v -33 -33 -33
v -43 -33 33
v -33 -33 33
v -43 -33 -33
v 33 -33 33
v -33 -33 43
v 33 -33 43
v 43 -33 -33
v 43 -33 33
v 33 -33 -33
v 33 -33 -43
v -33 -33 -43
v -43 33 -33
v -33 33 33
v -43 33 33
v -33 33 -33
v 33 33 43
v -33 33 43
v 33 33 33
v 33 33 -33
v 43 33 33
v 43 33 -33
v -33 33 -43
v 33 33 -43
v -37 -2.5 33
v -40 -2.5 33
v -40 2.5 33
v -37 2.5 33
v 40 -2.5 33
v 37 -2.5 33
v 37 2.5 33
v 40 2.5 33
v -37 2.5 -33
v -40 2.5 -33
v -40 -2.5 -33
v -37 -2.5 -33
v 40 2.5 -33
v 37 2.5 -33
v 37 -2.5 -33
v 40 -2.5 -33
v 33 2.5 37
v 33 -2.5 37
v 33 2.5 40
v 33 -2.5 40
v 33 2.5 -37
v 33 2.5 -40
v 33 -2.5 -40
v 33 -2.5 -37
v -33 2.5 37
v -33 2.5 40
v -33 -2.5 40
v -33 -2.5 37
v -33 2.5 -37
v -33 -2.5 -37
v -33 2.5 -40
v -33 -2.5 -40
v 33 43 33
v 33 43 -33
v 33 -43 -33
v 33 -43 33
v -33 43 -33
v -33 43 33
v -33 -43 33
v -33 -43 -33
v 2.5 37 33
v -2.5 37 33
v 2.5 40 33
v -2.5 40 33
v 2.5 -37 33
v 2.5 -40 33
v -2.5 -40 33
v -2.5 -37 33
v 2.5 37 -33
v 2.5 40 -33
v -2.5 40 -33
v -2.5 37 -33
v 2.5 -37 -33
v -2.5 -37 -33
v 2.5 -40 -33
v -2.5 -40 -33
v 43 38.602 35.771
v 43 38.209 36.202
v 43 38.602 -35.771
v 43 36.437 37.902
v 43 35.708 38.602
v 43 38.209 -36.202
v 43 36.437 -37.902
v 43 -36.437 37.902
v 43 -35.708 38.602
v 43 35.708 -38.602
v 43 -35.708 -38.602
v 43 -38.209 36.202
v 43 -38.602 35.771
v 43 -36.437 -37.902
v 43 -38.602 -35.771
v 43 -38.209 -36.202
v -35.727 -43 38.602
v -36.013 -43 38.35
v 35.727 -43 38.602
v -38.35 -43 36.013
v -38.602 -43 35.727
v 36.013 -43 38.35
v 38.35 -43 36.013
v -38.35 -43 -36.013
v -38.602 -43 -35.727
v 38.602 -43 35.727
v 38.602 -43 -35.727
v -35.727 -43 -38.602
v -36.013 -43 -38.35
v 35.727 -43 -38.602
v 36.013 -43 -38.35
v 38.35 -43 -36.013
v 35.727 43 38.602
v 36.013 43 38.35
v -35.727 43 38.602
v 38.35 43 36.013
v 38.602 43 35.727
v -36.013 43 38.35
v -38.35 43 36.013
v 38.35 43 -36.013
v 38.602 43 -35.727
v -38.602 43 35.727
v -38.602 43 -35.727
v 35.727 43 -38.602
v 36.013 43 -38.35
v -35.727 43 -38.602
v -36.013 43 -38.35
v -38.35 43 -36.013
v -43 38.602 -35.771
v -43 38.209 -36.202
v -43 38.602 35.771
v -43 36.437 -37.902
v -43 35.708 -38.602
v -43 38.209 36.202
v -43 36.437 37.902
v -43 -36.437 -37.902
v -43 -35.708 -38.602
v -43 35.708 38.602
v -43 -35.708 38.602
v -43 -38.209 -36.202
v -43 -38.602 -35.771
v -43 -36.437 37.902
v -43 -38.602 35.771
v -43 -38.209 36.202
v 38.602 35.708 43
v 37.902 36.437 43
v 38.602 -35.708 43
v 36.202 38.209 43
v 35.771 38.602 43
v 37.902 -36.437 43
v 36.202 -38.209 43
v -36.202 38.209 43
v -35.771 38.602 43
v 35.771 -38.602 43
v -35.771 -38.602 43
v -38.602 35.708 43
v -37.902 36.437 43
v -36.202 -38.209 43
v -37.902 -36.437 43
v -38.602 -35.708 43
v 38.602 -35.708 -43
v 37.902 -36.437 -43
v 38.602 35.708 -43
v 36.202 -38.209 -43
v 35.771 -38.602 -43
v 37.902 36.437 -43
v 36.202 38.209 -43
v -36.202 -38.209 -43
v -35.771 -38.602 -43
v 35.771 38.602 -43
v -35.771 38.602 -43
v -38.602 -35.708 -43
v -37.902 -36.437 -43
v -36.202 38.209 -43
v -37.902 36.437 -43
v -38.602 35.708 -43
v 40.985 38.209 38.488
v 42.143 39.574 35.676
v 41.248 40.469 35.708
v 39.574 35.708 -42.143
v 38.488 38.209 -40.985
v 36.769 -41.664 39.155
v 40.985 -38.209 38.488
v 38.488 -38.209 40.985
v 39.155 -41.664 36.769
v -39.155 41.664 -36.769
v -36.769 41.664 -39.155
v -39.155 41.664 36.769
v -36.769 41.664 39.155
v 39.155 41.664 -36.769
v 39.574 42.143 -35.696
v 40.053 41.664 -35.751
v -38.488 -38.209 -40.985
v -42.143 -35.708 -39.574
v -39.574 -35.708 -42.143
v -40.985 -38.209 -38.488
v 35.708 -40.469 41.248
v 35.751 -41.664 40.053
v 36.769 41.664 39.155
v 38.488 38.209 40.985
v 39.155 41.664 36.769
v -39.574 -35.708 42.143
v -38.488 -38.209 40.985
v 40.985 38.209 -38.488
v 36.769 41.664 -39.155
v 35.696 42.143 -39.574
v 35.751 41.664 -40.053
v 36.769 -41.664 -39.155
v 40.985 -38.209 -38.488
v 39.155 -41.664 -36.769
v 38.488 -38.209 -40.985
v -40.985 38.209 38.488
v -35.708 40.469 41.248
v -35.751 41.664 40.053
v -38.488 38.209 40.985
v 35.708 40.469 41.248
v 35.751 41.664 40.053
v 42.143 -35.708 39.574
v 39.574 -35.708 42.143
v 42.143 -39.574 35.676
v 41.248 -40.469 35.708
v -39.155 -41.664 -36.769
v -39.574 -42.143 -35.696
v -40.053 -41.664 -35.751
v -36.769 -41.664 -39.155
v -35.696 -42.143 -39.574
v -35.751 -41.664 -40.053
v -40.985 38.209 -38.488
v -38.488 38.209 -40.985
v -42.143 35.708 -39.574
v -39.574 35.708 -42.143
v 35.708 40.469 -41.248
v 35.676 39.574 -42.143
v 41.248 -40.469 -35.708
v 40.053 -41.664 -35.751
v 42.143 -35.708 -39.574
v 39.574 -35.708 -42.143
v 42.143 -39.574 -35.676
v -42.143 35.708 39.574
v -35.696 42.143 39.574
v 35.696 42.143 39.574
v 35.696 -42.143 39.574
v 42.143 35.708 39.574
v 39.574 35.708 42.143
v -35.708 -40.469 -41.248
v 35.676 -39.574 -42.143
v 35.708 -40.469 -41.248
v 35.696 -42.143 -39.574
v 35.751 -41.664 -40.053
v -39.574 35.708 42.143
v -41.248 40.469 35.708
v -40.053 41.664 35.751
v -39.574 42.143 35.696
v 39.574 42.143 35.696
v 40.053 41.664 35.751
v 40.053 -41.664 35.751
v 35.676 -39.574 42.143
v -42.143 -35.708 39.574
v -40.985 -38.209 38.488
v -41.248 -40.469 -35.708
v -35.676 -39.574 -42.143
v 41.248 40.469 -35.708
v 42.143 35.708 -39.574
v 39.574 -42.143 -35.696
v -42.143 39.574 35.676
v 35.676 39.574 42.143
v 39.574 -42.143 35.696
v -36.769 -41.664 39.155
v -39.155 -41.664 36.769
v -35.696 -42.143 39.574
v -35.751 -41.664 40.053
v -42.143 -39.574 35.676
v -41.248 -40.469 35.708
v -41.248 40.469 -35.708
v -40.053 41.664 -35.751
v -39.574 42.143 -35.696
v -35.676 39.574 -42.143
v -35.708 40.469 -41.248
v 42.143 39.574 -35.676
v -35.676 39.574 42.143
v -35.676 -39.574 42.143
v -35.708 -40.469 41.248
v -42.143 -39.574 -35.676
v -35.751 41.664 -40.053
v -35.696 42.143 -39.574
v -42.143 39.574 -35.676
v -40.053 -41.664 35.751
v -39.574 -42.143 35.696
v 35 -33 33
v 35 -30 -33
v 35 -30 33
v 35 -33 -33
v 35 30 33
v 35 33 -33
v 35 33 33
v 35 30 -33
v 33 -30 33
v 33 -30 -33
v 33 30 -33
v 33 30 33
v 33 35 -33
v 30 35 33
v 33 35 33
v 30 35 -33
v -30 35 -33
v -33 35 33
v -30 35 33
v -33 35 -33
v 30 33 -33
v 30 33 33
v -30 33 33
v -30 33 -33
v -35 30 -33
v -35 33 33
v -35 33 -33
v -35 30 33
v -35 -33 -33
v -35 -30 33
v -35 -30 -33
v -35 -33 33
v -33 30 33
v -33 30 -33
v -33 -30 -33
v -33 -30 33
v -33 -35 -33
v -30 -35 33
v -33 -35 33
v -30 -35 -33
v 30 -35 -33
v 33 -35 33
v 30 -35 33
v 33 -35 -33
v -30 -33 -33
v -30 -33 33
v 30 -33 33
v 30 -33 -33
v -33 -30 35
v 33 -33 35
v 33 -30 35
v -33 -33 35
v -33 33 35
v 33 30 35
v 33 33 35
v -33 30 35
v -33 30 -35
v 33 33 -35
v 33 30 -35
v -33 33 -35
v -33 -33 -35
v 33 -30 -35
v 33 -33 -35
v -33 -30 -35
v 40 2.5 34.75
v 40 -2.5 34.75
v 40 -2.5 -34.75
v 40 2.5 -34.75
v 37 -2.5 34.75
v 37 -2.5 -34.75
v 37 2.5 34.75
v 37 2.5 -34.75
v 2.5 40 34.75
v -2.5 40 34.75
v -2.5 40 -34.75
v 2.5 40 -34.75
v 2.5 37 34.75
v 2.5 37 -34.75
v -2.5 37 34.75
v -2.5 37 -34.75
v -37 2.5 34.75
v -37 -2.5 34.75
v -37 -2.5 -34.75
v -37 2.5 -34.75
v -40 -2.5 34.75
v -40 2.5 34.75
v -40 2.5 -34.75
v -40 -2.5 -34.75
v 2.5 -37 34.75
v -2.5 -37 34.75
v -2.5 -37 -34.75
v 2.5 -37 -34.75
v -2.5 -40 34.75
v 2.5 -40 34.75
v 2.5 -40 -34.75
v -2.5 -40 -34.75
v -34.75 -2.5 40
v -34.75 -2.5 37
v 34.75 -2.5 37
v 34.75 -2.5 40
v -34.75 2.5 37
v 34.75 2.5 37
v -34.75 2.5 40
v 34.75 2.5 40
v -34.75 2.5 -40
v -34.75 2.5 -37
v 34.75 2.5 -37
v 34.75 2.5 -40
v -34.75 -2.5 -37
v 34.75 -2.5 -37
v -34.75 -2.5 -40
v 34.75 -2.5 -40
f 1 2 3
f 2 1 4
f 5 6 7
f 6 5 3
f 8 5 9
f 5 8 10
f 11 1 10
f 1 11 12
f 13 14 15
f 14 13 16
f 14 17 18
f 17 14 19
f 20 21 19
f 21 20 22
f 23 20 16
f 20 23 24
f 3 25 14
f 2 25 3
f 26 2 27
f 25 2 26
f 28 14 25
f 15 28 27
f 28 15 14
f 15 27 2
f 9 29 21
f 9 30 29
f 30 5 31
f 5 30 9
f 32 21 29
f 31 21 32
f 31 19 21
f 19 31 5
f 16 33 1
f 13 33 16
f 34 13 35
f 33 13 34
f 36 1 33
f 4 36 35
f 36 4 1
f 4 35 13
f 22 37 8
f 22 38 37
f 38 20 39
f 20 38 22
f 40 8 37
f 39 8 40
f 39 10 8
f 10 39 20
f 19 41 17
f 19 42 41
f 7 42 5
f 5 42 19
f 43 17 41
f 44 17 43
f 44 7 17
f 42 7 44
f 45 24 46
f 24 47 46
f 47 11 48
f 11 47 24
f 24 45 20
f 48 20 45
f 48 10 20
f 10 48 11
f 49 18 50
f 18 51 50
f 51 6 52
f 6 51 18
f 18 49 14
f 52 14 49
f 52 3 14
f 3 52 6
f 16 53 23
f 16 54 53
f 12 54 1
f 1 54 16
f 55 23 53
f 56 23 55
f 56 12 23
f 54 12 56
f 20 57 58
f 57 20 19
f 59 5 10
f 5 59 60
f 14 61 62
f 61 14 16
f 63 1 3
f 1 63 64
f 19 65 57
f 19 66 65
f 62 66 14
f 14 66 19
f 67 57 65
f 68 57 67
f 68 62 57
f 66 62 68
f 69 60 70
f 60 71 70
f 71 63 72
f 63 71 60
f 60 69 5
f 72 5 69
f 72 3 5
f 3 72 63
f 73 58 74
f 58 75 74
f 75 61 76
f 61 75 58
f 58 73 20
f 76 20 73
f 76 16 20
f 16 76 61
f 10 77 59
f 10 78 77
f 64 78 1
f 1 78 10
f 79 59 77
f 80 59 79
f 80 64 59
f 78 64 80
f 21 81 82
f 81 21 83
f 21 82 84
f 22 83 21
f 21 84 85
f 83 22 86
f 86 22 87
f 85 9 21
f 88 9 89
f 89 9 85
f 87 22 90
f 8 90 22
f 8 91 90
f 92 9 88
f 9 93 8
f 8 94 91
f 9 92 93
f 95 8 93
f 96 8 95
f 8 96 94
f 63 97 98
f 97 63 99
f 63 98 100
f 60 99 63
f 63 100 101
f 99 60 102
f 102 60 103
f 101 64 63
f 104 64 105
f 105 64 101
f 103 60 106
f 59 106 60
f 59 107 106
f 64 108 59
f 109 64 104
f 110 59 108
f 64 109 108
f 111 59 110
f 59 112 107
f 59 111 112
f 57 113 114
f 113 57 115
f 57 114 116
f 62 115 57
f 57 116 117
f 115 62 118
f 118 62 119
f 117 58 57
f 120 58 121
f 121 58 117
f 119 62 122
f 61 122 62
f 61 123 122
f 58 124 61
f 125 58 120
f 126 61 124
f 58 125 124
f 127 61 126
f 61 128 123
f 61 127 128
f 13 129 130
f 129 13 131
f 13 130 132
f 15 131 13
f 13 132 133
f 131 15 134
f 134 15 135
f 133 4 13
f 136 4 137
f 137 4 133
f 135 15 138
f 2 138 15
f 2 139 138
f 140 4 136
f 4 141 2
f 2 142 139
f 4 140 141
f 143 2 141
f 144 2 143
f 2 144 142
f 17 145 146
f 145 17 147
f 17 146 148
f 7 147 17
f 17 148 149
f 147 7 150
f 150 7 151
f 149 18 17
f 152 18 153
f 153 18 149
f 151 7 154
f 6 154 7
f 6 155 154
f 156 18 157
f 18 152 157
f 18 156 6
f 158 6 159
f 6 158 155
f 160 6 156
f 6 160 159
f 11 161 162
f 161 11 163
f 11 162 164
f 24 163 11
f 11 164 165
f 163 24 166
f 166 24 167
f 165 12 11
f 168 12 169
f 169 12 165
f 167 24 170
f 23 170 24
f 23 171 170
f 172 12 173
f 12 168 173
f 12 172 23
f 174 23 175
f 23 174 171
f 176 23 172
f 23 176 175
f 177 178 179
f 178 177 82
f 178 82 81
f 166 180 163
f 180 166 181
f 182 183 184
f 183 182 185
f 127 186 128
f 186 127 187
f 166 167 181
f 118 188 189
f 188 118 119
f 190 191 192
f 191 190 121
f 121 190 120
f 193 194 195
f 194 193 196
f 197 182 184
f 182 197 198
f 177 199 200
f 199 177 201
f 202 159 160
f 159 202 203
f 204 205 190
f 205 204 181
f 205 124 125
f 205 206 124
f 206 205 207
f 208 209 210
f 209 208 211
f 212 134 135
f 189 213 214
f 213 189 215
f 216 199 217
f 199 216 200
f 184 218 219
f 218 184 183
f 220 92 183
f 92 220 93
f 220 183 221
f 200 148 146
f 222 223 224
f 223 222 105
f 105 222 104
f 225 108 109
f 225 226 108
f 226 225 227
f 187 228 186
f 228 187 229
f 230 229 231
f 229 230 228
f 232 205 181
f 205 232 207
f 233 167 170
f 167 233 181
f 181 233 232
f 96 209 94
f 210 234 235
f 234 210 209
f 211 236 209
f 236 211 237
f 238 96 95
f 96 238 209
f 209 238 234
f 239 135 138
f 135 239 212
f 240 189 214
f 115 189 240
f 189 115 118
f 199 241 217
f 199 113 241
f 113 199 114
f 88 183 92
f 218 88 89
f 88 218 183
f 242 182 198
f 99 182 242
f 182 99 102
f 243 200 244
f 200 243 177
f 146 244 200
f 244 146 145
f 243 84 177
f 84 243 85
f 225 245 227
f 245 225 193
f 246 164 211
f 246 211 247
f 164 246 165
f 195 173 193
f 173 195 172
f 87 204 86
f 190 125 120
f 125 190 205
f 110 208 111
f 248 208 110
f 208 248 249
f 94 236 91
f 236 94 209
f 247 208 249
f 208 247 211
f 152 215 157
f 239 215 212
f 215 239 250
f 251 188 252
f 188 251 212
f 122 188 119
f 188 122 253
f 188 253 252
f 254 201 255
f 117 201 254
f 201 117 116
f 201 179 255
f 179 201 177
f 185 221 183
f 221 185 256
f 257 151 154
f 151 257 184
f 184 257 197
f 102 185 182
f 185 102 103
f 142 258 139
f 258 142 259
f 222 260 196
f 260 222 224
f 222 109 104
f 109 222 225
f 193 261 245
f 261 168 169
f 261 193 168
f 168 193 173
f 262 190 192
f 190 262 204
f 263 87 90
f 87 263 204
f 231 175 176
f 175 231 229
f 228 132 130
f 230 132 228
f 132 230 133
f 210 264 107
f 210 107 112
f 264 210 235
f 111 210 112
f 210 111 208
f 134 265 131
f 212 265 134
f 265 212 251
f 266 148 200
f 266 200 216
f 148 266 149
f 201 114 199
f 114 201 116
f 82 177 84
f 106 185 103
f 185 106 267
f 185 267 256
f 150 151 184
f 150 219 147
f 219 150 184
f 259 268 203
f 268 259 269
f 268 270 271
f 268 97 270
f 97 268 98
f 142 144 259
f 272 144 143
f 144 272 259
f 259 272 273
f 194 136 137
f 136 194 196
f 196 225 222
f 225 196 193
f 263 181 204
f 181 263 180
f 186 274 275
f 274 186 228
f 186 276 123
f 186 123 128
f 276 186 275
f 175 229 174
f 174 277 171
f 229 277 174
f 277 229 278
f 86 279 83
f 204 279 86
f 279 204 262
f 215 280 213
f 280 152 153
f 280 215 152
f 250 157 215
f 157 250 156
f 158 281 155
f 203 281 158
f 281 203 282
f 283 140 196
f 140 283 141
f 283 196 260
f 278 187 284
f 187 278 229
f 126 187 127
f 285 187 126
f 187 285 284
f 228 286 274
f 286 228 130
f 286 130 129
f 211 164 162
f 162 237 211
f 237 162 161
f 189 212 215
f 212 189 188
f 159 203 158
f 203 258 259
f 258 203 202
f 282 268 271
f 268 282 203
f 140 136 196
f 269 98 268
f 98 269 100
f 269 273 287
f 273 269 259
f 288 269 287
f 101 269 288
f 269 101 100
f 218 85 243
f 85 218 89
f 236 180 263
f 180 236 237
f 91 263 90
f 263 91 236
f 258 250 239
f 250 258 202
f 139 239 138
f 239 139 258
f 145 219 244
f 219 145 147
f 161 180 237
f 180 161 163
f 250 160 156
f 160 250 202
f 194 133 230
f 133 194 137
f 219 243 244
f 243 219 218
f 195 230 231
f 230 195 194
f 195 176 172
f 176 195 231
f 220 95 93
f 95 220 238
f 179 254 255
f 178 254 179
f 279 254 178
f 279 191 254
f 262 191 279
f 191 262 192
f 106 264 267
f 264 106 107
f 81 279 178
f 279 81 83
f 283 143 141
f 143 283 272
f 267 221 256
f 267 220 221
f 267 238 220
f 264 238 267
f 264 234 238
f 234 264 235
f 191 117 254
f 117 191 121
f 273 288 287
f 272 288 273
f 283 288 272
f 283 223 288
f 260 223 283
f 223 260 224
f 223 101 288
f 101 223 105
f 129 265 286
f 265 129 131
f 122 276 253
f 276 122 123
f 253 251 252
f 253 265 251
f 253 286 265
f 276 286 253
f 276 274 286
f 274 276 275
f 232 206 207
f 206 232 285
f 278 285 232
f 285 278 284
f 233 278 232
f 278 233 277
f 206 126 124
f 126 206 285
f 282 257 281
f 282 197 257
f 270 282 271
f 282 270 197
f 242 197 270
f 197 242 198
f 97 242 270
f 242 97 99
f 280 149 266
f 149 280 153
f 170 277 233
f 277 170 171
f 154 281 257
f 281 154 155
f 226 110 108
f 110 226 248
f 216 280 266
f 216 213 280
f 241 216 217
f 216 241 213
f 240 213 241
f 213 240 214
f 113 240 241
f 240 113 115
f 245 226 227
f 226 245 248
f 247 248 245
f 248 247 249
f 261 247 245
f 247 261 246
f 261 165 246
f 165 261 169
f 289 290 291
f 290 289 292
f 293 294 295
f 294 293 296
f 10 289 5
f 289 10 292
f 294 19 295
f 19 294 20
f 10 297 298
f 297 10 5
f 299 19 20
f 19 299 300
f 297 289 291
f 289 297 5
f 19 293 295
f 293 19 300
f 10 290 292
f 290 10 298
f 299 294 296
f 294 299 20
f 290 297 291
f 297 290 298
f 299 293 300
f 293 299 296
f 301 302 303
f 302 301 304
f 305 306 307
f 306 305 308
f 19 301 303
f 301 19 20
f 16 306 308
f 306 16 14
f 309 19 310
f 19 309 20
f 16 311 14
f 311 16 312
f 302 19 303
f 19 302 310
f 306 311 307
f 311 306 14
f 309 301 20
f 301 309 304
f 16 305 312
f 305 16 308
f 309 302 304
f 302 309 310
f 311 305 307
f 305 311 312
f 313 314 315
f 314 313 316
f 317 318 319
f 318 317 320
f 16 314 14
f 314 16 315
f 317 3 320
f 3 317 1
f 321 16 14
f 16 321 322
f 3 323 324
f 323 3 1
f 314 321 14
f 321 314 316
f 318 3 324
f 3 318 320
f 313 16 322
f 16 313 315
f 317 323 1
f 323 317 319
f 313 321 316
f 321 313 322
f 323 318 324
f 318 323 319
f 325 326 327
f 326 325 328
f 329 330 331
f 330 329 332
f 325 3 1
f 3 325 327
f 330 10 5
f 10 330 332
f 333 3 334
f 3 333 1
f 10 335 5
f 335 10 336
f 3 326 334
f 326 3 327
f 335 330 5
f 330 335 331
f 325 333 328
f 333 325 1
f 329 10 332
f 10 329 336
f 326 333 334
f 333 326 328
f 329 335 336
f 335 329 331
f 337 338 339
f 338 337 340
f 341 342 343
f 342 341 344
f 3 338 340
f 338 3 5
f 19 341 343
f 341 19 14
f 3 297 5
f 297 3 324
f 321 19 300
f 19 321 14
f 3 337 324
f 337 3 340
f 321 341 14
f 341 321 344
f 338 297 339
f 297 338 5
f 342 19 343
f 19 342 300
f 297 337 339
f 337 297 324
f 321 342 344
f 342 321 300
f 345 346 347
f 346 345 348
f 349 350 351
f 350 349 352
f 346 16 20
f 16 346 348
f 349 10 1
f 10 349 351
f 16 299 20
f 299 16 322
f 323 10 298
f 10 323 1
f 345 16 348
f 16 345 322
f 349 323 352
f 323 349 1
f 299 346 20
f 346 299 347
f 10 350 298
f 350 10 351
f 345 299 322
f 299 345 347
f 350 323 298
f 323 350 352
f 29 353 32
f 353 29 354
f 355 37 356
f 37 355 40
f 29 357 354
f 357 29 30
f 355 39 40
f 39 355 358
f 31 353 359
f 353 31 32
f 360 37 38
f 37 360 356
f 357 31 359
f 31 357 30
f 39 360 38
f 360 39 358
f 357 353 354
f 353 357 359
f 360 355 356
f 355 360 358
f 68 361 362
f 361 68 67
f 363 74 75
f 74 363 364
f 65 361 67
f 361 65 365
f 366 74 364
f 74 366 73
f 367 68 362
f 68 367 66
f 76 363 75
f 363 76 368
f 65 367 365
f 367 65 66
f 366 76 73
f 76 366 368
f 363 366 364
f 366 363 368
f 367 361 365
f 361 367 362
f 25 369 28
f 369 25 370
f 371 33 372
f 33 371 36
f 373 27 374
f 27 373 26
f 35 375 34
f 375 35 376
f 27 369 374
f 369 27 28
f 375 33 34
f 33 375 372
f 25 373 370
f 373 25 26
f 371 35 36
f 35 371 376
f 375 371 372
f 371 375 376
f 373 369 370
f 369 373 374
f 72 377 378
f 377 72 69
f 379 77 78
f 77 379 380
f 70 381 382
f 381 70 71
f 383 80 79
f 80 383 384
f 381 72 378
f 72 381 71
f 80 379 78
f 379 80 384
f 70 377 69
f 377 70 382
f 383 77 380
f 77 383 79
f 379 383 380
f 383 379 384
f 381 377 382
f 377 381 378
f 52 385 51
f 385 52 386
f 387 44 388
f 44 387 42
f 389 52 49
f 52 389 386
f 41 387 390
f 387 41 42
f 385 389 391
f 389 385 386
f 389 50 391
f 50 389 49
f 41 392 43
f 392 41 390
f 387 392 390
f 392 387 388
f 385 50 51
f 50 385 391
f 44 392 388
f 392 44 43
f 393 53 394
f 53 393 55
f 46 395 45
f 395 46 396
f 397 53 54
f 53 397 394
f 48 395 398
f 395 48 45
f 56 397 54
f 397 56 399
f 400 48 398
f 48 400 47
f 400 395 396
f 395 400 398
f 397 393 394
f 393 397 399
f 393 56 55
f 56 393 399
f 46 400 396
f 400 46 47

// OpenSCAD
$fn = 100;

// printed part
// diffusor / mounted on led panel
$height_mm = 5;
$outer_wall_space_mm = 1;
$diffusor_width_mm = 0.8;
$wall_width_mm = 2;
$nudge_center_from_outside_mm = 4.5;
$nudge_depth_mm = 3.5;
$nudge_width_mm = 5;
$nudge_height_mm = 3;
// cube / frame / diffusor mount
$mount_surface_mm = 3;
$mount_offset_mm = 2;
$tolerance_mm = 0.5;
$panel_space_mm = 5;
$edge_cut_mm = 3;
$corner_cut_mm = 6.5;

//// 8x8
$num_leds_x = 8;
$led_dist_x = 65/8;
// 16x16
//$num_leds_x = 16;
//$num_leds_y = 16;
//$led_dist_x = 10;
//$led_dist_y = 10;

// because cube
$num_leds_y = $num_leds_x;
$led_dist_y = $led_dist_x;

// main
$wall_height_mm = $height_mm - $outer_wall_space_mm;
$outer_x = ($num_leds_x) * $led_dist_x;
$outer_y = ($num_leds_y) * $led_dist_y;

$small= $outer_x + ($tolerance_mm) * 2;
$big = $small + ($height_mm + $panel_space_mm) * 2;

$corner_sphere_radius = sqrt(3 * pow($big/2, 2))-$corner_cut_mm;
$edge_cylinder_radius = sqrt(2 * pow($big/2, 2))-$edge_cut_mm;

// easier to print with this rotation
rotate([90,0,0])
difference() {
    union() {
        panelFrameCube();
        mountSurfaces();
    }
    nudges();
}

module nudges() {
    nudge([0,0,0]);
    nudge([0,90,0]);
    nudge([0,180,0]);
    nudge([0,270,0]);

    nudge([0,0,90]);
    nudge([0,180,90]);
}

module nudge(r) {
    rotate(r) {
        translate([$big/2 - $nudge_center_from_outside_mm, 0, 0]) {
            cube([$nudge_height_mm,$small
            + $nudge_depth_mm
            ,$nudge_width_mm], center=true);
        }
    }
}

module panelFrameCube() {
    edgeCut() {
        difference() {
            cube([$big,$big,$big], center=true);
            union() {
                cube([$big + 1, 
                    $small, 
                    $small], center=true);
                cube([$small, 
                    $big + 1, 
                    $small], center=true);
                cube([$small, 
                    $small, 
                    $big + 1], center=true);
            }
        }
    }
}

module mountSurfaces() {
    mountSurface([0,0,0]);
    mountSurface([0,90,0]);
    mountSurface([0,180,0]);
    mountSurface([0,270,0]);

    mountSurface([0,0,90]);
    mountSurface([0,180,90]);
}

module mountSurface(r) {
    rotate(r)
    translate([($small+$mount_offset_mm)/2,0,0])
    difference() {
        cube([$mount_offset_mm,$small-0.001,$small-0.001], center=true);
        cube([$mount_offset_mm*2,$small,$small-(2*$mount_surface_mm)], center=true);
    }
}

module edgeCut() {
    edgeCutCylinder([0,90,0]) 
        edgeCutCylinder([90,0,0]) 
            edgeCutCylinder([0,0,0])
                intersection() {
                    sphere(r = $corner_sphere_radius);
                    children();
                }
}


module edgeCutCylinder(ro) {
    intersection() {
        rotate(ro){
            cylinder(h=$big*2, r=$edge_cylinder_radius, center=true);
        }
        children();
    }
}
